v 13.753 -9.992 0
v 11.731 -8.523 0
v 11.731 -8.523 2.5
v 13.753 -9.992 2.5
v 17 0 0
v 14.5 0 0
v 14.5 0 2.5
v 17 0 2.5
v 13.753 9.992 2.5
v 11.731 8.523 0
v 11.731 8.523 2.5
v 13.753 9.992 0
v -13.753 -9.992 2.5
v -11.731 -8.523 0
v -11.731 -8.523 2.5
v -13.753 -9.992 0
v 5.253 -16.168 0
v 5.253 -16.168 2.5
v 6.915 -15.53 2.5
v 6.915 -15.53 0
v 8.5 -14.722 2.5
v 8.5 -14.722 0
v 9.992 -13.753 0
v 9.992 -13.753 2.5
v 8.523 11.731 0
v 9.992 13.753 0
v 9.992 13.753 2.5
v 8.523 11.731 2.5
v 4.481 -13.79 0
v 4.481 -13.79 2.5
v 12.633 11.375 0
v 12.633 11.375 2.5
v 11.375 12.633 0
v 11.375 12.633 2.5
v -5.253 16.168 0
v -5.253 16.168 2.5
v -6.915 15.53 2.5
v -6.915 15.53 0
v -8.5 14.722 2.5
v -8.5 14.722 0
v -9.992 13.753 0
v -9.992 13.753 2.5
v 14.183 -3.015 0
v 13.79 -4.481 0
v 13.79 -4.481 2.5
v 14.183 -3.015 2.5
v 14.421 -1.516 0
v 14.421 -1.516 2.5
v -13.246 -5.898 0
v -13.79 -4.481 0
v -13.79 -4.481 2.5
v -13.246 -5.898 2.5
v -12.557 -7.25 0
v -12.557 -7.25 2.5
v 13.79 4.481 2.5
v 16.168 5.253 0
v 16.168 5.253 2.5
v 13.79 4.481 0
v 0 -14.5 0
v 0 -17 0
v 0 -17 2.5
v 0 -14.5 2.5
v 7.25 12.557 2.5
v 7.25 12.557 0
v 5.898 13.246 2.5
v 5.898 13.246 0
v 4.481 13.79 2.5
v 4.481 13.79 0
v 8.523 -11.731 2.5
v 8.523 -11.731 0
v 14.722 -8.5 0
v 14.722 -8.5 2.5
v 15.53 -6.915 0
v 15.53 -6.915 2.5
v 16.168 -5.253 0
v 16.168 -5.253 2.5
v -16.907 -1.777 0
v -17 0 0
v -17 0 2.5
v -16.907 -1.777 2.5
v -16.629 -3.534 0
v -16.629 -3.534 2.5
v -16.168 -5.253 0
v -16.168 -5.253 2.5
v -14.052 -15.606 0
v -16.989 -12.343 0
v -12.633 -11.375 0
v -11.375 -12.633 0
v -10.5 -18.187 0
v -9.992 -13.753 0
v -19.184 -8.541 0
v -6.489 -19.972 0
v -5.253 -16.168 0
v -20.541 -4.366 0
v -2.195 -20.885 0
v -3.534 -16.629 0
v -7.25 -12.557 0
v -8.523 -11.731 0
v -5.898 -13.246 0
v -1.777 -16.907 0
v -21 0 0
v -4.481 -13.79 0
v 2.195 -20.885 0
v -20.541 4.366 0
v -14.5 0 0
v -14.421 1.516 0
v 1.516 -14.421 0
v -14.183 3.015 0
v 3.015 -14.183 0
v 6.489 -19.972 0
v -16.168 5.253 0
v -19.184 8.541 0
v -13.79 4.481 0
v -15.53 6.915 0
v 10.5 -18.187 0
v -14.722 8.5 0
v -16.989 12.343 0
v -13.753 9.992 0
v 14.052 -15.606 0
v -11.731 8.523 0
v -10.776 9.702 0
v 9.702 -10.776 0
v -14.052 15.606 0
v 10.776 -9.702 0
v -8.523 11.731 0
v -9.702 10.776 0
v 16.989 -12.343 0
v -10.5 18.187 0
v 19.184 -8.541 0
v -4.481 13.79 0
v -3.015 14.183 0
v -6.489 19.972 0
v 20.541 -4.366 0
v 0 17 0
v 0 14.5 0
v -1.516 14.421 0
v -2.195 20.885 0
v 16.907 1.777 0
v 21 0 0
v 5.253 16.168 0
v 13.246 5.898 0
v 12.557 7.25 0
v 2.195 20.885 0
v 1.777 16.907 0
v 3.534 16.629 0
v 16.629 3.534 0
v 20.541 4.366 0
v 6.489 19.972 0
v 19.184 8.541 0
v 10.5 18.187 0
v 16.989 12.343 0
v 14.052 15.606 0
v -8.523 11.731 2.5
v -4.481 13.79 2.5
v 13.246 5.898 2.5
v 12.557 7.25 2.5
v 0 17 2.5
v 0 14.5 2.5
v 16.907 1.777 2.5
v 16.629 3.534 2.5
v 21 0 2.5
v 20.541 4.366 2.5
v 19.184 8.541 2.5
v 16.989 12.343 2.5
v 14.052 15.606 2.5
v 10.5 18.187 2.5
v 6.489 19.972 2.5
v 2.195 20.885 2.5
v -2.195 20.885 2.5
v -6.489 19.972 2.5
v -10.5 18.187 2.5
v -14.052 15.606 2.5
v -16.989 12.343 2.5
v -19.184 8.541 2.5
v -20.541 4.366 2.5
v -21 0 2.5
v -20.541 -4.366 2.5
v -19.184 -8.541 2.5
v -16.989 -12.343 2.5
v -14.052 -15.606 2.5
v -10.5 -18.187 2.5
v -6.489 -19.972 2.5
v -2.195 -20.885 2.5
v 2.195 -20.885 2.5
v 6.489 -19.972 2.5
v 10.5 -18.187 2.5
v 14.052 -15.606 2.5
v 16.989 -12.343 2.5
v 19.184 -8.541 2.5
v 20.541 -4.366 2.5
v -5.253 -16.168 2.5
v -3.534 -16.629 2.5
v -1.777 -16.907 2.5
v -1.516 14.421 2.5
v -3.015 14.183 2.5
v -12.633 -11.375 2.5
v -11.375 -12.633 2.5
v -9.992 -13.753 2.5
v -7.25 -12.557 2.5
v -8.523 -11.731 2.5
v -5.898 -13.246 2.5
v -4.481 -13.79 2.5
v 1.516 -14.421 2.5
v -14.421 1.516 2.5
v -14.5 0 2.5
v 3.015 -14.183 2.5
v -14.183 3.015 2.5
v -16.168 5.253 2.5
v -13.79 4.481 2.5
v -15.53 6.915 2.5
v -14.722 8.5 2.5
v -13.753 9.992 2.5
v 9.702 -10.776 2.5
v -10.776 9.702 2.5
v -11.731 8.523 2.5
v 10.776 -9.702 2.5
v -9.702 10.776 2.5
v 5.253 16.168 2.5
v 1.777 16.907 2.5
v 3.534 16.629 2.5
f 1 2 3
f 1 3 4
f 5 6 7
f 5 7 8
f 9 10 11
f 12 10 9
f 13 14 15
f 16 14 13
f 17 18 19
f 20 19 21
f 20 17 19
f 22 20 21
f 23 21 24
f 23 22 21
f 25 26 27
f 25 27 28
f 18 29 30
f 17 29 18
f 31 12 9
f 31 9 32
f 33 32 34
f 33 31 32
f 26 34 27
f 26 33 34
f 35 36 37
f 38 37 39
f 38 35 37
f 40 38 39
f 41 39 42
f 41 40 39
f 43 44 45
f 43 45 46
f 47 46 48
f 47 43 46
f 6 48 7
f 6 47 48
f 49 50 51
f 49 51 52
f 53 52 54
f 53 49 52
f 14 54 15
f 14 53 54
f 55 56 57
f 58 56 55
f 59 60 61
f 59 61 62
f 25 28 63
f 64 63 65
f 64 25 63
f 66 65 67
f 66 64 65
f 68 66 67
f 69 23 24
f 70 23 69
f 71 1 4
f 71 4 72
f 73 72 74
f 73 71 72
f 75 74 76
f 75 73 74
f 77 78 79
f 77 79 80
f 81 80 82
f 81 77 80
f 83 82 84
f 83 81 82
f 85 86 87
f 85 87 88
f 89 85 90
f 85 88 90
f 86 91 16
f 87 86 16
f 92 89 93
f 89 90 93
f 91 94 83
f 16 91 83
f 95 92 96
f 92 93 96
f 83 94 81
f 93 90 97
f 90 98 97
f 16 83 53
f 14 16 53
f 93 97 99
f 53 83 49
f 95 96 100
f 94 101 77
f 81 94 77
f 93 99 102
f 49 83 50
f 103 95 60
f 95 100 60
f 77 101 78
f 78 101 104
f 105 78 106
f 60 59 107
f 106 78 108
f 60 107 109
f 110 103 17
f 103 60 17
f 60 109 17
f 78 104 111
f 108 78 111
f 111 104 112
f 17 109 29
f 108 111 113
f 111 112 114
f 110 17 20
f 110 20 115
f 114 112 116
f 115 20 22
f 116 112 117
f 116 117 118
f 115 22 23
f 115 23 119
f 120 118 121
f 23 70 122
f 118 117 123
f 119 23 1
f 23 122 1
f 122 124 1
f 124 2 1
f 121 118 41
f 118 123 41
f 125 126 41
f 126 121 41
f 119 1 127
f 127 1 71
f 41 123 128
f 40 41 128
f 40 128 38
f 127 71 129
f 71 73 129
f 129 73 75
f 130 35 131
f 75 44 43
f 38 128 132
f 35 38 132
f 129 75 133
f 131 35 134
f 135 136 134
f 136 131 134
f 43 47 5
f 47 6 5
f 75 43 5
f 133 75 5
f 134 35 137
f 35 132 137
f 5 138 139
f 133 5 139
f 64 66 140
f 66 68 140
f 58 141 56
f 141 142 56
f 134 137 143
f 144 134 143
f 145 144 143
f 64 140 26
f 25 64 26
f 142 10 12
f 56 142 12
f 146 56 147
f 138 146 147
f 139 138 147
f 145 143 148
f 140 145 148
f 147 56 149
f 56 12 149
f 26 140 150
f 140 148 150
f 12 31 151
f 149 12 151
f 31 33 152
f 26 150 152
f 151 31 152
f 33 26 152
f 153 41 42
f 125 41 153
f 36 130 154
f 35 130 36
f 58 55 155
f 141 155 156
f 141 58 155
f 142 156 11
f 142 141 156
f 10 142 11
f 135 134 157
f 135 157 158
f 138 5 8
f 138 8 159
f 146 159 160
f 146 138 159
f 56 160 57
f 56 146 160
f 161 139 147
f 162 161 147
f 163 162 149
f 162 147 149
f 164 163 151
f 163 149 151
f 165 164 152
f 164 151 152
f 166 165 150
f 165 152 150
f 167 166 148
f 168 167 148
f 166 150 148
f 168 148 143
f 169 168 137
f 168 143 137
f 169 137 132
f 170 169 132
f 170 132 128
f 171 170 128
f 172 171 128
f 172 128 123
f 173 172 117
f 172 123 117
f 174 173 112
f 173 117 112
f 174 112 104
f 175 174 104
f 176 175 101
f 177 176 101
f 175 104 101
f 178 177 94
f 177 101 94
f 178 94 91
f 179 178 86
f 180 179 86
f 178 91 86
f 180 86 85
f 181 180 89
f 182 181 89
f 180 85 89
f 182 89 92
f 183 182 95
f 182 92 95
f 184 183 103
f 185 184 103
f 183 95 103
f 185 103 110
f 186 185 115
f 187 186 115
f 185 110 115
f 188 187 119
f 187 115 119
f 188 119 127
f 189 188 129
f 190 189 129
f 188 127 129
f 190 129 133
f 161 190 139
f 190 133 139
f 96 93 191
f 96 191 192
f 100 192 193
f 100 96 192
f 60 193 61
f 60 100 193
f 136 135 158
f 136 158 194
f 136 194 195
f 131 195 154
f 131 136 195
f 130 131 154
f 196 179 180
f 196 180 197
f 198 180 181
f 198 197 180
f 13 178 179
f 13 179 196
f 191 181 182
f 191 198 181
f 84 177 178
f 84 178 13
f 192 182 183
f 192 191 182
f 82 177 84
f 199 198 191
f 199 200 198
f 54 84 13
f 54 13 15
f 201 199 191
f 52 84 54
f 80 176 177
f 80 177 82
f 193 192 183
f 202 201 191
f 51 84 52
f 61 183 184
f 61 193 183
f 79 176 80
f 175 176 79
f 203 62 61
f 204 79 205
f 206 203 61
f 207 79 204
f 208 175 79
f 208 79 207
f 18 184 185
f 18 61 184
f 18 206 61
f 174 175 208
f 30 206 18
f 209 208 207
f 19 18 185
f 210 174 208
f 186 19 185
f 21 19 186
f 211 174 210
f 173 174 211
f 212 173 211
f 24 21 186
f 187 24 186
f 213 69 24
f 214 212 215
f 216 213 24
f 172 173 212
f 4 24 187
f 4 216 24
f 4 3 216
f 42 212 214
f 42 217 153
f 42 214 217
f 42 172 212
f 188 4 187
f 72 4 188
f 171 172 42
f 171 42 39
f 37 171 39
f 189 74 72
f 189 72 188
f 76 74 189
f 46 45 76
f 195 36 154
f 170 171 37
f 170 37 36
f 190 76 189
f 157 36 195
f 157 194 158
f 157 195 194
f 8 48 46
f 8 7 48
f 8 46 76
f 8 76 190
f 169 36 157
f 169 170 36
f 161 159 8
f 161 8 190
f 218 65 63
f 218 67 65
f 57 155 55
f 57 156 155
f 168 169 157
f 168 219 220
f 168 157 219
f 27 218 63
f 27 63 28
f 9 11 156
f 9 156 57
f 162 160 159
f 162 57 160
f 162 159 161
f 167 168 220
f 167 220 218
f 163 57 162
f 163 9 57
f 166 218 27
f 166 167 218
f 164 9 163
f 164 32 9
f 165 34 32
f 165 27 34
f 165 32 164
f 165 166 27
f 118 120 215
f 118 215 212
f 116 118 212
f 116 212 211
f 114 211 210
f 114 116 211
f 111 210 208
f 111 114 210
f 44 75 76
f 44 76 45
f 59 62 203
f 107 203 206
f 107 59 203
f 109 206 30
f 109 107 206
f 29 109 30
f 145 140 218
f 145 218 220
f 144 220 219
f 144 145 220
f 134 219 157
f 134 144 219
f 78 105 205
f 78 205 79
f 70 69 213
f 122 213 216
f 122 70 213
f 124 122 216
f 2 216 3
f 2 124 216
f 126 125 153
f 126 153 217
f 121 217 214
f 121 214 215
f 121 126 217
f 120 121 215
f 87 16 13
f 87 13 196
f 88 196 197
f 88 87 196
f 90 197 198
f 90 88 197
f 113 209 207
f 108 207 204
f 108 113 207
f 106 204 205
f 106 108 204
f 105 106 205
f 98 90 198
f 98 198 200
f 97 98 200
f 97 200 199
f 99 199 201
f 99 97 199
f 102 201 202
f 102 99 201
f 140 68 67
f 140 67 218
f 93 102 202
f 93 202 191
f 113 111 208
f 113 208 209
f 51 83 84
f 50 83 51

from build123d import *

# Parameters (mm, degrees)
SKETCH1_R           = 21
SKETCH1_R_2         = 14.5
BOSS_EXTRUDE1_DEPTH = 2.5
CUT_EXTRUDE1_START  = -4
CUT_EXTRUDE1_DEPTH  = 4


with BuildPart() as part:
    # Sketch1 → Boss-Extrude1 (new body)
    with BuildSketch(Plane.XY):
        Circle(SKETCH1_R)
        Circle(SKETCH1_R_2, mode=Mode.SUBTRACT)
    extrude(amount=BOSS_EXTRUDE1_DEPTH)

    # Sketch2 → Cut-Extrude1 (cut)
    with BuildSketch(Plane.XY.offset(2.5).offset(CUT_EXTRUDE1_START)):
        with BuildLine():
            Line((0, 17), (0, 14.5))
            ThreePointArc((0, 14.5), (2.268299743, 14.321480939), (4.480746418, 13.790319486))
            Line((4.480746418, 13.790319486), (5.253288904, 16.167960777))
            ThreePointArc((5.253288904, 16.167960777), (2.659385906, 16.79070179), (0, 17))
        make_face()
        with BuildLine():
            Line((9.992349289, 13.753288904), (8.522886158, 11.730746418))
            ThreePointArc((8.522886158, 11.730746418), (10.253048327, 10.253048327), (11.730746418, 8.522886158))
            Line((11.730746418, 8.522886158), (13.753288904, 9.992349289))
            ThreePointArc((13.753288904, 9.992349289), (12.02081528, 12.02081528), (9.992349289, 13.753288904))
        make_face()
        with BuildLine():
            Line((16.167960777, 5.253288904), (13.790319486, 4.480746418))
            ThreePointArc((13.790319486, 4.480746418), (14.321480939, 2.268299743), (14.5, 0))
            Line((14.5, 0), (17, 0))
            ThreePointArc((17, 0), (16.79070179, 2.659385906), (16.167960777, 5.253288904))
        make_face()
        with BuildLine():
            Line((16.167960777, -5.253288904), (13.790319486, -4.480746418))
            ThreePointArc((13.790319486, -4.480746418), (12.919594601, -6.582862246), (11.730746418, -8.522886158))
            Line((11.730746418, -8.522886158), (13.753288904, -9.992349289))
            ThreePointArc((13.753288904, -9.992349289), (15.147110911, -7.717838496), (16.167960777, -5.253288904))
        make_face()
        with BuildLine():
            Line((9.992349289, -13.753288904), (8.522886158, -11.730746418))
            ThreePointArc((8.522886158, -11.730746418), (6.582862246, -12.919594601), (4.480746418, -13.790319486))
            Line((4.480746418, -13.790319486), (5.253288904, -16.167960777))
            ThreePointArc((5.253288904, -16.167960777), (7.717838496, -15.147110911), (9.992349289, -13.753288904))
        make_face()
        with BuildLine():
            Line((0, -17), (0, -14.5))
            ThreePointArc((0, -14.5), (-2.268299743, -14.321480939), (-4.480746418, -13.790319486))
            Line((-4.480746418, -13.790319486), (-5.253288904, -16.167960777))
            ThreePointArc((-5.253288904, -16.167960777), (-2.659385906, -16.79070179), (0, -17))
        make_face()
        with BuildLine():
            Line((-9.992349289, -13.753288904), (-8.522886158, -11.730746418))
            ThreePointArc((-8.522886158, -11.730746418), (-10.253048327, -10.253048327), (-11.730746418, -8.522886158))
            Line((-11.730746418, -8.522886158), (-13.753288904, -9.992349289))
            ThreePointArc((-13.753288904, -9.992349289), (-12.02081528, -12.02081528), (-9.992349289, -13.753288904))
        make_face()
        with BuildLine():
            Line((-16.167960777, -5.253288904), (-13.790319486, -4.480746418))
            ThreePointArc((-13.790319486, -4.480746418), (-14.321480939, -2.268299743), (-14.5, 0))
            Line((-14.5, 0), (-17, 0))
            ThreePointArc((-17, 0), (-16.79070179, -2.659385906), (-16.167960777, -5.253288904))
        make_face()
        with BuildLine():
            Line((-16.167960777, 5.253288904), (-13.790319486, 4.480746418))
            ThreePointArc((-13.790319486, 4.480746418), (-12.919594601, 6.582862246), (-11.730746418, 8.522886158))
            Line((-11.730746418, 8.522886158), (-13.753288904, 9.992349289))
            ThreePointArc((-13.753288904, 9.992349289), (-15.147110911, 7.717838496), (-16.167960777, 5.253288904))
        make_face()
        with BuildLine():
            Line((-9.992349289, 13.753288904), (-8.522886158, 11.730746418))
            ThreePointArc((-8.522886158, 11.730746418), (-6.582862246, 12.919594601), (-4.480746418, 13.790319486))
            Line((-4.480746418, 13.790319486), (-5.253288904, 16.167960777))
            ThreePointArc((-5.253288904, 16.167960777), (-7.717838496, 15.147110911), (-9.992349289, 13.753288904))
        make_face()
    extrude(amount=CUT_EXTRUDE1_DEPTH, mode=Mode.SUBTRACT)


solid = part.part
